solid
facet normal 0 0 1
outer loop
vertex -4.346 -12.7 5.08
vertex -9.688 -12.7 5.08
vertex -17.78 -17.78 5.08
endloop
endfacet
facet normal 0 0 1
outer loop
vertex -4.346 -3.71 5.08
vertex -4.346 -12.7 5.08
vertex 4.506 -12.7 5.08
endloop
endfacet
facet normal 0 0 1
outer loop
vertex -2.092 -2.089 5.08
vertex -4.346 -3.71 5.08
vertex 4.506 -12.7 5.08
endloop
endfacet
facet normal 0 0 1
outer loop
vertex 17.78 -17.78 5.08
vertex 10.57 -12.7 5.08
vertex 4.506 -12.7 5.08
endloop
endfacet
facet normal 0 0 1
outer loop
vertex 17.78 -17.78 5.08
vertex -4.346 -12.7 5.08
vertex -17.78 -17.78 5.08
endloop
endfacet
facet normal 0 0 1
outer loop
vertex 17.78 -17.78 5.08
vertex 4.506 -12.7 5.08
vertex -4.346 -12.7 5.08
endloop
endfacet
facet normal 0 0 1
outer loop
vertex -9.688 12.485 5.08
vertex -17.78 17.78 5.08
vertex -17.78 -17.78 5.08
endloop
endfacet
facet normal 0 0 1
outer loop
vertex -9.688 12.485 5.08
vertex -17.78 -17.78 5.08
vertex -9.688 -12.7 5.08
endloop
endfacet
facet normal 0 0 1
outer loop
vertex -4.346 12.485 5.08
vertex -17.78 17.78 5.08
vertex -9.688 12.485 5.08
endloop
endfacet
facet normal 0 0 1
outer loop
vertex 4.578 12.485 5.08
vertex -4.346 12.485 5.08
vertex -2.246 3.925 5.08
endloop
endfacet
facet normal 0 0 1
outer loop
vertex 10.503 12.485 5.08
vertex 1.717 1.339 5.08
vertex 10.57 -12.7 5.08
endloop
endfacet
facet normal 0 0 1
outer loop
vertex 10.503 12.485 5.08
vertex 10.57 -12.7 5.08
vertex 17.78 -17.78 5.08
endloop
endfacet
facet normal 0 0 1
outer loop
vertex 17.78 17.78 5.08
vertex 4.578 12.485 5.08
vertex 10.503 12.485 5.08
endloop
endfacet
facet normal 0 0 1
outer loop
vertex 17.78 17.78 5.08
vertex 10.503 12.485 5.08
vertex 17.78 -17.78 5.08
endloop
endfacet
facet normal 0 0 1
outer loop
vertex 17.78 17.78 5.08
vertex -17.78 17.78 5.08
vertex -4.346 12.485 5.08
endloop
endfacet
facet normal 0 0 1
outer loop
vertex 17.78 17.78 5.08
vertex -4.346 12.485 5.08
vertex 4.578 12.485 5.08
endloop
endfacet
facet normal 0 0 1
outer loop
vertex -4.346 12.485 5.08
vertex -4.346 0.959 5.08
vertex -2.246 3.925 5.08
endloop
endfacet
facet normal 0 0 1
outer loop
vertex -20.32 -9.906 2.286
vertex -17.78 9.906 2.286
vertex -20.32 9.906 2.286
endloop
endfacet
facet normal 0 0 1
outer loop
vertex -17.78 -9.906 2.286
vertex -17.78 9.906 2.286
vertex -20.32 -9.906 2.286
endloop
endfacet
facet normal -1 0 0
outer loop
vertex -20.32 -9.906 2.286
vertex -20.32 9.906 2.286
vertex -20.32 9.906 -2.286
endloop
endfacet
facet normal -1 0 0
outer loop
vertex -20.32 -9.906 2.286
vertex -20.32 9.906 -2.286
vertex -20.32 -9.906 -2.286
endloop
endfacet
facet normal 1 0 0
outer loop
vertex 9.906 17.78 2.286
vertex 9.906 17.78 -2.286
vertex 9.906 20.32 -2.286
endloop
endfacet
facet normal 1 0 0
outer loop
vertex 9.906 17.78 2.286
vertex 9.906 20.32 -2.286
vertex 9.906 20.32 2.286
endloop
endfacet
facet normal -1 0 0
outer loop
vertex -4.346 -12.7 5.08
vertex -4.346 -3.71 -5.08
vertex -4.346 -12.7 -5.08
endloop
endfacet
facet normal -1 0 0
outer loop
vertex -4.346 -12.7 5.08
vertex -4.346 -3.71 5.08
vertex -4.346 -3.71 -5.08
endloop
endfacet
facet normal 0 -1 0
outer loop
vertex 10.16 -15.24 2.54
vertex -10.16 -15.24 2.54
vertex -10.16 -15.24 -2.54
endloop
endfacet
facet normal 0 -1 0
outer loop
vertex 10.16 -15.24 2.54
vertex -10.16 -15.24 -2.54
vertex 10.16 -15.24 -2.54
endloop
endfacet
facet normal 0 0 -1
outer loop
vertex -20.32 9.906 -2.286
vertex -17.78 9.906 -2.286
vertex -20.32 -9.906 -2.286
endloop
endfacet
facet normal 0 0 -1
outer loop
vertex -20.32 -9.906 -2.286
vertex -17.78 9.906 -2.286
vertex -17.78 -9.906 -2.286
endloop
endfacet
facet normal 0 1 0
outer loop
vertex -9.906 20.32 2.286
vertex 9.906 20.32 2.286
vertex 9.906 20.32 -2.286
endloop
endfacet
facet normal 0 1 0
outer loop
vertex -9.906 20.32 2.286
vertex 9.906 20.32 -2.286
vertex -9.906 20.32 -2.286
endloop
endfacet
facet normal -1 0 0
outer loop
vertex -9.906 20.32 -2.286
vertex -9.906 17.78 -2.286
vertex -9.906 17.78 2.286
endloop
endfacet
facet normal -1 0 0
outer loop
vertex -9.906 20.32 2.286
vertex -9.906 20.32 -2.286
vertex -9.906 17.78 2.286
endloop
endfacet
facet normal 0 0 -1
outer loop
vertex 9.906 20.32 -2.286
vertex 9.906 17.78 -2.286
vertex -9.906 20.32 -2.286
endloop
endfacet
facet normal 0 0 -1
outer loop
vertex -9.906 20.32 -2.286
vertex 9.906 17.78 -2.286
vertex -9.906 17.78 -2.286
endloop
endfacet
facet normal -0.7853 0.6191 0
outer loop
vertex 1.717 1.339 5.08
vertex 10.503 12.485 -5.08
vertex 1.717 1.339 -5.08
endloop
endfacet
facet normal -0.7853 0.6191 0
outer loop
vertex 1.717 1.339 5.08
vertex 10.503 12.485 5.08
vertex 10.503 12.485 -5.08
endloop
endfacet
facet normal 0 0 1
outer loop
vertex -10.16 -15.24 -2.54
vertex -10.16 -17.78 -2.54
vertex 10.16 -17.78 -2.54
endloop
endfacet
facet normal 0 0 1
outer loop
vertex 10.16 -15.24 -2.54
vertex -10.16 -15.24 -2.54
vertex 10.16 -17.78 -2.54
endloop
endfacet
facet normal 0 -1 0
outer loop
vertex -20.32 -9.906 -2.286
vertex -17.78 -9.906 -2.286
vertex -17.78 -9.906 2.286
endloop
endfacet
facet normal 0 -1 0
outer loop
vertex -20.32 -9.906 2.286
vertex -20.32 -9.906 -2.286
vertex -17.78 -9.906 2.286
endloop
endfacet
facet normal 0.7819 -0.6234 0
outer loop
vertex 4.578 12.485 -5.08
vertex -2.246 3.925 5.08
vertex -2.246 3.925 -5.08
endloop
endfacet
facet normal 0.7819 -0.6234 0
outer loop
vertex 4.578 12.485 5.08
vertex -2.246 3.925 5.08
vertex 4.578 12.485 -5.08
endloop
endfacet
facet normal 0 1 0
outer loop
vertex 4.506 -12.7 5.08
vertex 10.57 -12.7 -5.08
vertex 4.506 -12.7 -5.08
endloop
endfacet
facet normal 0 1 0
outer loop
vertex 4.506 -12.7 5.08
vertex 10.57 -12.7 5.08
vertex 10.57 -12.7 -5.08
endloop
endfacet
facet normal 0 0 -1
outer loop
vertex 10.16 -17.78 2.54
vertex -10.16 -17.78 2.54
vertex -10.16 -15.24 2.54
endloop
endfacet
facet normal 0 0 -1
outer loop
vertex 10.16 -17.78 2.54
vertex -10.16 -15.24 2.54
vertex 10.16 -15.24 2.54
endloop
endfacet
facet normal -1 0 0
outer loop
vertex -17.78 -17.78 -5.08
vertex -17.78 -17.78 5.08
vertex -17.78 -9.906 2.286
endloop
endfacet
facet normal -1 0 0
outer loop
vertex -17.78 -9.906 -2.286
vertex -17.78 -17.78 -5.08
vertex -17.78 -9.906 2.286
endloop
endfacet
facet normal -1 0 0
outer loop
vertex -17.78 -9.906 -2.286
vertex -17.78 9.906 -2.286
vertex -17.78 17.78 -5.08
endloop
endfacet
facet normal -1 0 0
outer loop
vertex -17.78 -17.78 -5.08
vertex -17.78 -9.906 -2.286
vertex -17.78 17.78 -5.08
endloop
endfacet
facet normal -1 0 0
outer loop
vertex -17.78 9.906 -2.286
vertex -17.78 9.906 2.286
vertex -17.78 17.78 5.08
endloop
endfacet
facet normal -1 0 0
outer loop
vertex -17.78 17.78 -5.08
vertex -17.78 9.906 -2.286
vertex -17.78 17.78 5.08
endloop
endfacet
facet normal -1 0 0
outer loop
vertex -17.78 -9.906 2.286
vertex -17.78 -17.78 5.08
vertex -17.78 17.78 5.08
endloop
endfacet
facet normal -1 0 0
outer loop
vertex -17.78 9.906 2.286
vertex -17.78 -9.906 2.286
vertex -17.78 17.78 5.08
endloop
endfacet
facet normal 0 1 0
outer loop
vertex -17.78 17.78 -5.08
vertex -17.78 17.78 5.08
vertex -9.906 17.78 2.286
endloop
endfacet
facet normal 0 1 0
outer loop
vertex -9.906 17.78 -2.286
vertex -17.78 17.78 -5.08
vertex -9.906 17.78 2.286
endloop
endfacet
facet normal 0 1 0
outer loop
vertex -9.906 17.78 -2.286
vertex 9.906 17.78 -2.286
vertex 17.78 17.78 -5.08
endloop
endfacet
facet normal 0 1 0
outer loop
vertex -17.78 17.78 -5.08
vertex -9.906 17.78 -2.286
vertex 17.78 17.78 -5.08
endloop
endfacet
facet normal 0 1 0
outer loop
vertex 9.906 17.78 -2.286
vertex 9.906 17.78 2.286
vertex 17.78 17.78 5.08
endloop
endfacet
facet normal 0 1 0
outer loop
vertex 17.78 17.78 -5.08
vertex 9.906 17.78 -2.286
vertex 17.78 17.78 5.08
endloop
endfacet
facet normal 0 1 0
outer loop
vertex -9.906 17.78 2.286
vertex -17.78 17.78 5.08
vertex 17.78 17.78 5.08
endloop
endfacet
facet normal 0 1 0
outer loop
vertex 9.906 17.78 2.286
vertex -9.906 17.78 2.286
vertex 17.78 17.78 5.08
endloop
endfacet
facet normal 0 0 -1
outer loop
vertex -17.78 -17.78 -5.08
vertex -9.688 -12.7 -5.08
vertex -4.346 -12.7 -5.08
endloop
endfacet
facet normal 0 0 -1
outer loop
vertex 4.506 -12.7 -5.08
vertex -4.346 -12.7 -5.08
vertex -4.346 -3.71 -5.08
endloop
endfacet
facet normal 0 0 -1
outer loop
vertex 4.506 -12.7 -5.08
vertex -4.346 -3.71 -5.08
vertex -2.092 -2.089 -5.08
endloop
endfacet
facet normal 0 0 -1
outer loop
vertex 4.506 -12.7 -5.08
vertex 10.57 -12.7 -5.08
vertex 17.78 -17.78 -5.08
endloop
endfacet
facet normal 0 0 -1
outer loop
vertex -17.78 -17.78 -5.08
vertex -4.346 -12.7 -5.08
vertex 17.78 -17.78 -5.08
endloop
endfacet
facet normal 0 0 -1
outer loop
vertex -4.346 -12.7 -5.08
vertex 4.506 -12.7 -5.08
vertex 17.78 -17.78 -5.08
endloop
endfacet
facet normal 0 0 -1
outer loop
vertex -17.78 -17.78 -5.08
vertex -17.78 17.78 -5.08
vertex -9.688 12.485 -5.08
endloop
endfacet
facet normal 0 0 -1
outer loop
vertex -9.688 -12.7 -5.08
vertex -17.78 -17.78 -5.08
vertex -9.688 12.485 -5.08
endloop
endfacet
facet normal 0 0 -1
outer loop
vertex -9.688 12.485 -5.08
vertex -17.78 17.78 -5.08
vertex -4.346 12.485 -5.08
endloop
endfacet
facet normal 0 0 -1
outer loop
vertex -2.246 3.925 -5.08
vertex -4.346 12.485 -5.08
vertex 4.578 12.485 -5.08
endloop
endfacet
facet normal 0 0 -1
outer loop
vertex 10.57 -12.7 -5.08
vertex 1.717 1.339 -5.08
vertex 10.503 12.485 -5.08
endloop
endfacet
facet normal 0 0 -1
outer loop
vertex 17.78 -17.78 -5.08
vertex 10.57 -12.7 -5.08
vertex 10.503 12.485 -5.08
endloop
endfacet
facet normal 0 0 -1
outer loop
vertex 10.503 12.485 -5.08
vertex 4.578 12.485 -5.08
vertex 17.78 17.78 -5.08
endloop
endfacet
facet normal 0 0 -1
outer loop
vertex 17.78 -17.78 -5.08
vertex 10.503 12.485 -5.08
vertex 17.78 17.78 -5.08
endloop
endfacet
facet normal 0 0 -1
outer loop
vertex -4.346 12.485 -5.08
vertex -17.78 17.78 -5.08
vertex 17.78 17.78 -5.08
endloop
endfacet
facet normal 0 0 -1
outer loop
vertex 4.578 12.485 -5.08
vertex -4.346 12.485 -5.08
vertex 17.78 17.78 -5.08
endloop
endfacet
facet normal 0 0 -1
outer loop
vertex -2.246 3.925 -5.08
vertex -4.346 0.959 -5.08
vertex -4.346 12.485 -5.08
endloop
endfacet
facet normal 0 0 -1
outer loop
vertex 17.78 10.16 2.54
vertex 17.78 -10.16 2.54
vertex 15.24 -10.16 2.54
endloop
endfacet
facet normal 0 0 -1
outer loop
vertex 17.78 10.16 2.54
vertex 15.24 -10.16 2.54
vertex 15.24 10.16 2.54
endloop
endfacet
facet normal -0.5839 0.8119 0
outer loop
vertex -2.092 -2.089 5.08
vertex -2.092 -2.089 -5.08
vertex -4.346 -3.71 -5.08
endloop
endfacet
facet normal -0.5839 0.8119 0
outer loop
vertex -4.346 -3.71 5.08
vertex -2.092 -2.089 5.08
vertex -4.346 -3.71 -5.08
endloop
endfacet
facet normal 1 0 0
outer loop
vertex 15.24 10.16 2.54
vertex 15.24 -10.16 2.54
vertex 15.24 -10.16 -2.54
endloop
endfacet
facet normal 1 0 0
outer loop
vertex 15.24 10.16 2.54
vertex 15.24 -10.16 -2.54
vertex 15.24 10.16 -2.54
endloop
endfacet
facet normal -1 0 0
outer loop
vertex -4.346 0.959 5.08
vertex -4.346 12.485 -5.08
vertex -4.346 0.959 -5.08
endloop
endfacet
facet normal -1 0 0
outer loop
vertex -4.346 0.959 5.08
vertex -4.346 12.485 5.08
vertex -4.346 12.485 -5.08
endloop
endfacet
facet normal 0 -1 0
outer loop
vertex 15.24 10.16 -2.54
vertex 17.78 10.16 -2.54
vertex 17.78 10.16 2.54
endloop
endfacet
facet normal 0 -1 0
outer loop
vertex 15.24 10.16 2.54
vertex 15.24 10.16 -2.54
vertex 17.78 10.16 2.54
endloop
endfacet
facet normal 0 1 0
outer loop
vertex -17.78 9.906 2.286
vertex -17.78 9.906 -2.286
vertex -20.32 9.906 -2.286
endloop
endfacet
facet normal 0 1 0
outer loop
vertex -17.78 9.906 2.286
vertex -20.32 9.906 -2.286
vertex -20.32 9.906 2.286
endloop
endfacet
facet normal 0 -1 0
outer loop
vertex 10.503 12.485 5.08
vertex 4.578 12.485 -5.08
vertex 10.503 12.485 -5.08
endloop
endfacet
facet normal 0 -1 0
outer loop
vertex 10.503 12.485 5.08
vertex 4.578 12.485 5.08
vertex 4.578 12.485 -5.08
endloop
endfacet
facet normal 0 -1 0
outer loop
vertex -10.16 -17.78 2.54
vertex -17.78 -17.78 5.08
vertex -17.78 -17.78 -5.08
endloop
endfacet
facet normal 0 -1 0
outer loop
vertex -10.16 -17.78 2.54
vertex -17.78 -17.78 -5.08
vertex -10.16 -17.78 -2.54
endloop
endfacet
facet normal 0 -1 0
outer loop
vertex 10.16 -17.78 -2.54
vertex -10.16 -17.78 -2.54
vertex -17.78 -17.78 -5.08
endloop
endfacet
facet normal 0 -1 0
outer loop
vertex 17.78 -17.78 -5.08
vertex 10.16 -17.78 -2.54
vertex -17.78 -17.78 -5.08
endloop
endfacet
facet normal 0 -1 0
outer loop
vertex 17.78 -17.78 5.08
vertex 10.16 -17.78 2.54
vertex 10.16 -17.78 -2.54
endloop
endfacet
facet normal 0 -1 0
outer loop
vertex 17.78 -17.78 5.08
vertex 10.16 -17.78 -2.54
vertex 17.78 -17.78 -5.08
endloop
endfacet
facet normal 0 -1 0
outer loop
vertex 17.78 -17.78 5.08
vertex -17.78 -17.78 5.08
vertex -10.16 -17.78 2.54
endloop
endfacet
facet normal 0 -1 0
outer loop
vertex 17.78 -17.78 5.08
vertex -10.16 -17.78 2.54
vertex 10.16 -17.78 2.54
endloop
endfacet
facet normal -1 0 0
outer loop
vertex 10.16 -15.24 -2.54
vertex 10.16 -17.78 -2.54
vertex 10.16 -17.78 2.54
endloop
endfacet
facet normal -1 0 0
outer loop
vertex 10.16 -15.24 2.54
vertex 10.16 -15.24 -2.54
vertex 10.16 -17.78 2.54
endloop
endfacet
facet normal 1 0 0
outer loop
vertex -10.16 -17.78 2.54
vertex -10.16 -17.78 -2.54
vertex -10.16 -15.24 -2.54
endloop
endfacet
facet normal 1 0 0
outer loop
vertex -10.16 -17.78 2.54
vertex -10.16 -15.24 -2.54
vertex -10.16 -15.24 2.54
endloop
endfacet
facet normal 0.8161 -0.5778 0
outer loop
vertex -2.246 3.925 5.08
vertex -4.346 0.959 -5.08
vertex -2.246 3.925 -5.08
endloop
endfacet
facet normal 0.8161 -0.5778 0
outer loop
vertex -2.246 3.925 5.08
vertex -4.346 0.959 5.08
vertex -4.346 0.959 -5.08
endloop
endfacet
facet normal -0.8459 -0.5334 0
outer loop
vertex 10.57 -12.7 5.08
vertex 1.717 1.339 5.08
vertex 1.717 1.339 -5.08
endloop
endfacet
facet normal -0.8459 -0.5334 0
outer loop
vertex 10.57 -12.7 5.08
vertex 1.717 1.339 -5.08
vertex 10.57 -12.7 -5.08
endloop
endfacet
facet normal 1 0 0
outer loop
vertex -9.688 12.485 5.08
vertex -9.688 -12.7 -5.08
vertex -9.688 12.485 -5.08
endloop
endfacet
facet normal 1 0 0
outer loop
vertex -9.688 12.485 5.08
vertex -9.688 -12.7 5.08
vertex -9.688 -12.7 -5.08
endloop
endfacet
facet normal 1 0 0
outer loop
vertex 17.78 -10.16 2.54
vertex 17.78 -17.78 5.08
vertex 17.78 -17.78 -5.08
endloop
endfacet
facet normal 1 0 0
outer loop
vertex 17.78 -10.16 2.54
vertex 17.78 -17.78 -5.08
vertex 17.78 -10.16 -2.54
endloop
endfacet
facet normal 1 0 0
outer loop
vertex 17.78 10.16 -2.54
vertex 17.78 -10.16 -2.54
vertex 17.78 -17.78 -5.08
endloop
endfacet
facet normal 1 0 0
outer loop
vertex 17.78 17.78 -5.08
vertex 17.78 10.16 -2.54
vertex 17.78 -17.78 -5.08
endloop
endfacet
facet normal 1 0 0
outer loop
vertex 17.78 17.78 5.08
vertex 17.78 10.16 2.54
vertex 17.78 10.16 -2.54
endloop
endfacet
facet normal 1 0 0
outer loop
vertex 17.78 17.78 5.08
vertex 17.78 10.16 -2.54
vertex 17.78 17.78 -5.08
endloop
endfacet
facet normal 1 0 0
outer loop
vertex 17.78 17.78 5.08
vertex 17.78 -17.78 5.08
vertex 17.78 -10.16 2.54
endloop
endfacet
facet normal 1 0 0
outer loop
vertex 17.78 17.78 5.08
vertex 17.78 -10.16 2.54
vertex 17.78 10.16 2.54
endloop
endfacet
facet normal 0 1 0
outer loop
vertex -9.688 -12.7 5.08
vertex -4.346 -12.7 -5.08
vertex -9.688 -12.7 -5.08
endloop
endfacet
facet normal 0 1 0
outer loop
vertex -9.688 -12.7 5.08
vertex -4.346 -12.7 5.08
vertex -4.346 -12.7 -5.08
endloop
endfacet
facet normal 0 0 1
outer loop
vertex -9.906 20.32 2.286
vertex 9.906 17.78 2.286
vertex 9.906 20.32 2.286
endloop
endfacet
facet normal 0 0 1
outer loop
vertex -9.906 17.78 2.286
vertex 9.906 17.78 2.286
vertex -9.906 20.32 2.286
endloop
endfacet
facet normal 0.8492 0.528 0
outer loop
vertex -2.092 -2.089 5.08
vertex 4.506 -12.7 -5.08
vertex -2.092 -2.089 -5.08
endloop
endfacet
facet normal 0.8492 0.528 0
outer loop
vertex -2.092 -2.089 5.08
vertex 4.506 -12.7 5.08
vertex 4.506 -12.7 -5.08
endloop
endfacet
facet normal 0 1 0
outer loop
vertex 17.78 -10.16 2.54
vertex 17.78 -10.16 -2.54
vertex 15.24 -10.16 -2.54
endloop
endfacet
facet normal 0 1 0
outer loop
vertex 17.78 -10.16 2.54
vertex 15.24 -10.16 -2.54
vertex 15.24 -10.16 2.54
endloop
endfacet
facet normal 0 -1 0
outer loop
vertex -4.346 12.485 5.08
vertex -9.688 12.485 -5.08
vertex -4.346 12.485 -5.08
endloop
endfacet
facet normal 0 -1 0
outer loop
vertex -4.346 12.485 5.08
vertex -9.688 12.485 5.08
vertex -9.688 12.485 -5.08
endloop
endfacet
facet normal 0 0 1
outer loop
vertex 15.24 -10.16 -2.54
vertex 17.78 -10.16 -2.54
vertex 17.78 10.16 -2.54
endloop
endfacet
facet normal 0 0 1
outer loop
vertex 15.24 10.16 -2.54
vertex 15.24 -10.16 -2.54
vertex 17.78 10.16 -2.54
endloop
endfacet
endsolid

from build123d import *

# Parameters (mm, degrees)
F0_W     = 35.56
F0_H     = 35.56
F1_DEPTH = 5.08
F2_W     = 19.812
F2_H     = 4.572
F3_DEPTH = 2.54
F4_W     = 19.812
F4_H     = 4.572
F5_DEPTH = 2.54
F6_W     = 20.32
F6_H     = 5.08
F7_DEPTH = 2.54
F8_W     = 20.32
F8_H     = 5.08
F9_DEPTH = 2.54


with BuildPart() as f1:
    # F0 (on Top) → F1 (new body, symmetric)
    with BuildSketch(Plane.XY):
        Rectangle(F0_W, F0_H)
        Polygon((1.7170355903, 1.339453125), (10.5695529514, -12.7), (4.5061848958, -12.7), (-2.0918619792, -2.0891059028), (-4.3463324653, -3.7096788194), (-4.3463324653, -12.7), (-9.6876085069, -12.7), (-9.6876085069, 12.4850260417), (-4.3463324653, 12.4850260417), (-4.3463324653, 0.9591145833), (-2.2462022569, 3.9246527778), (4.5778428819, 12.4850260417), (10.5034071181, 12.4850260417), align=None, mode=Mode.SUBTRACT)
    extrude(amount=F1_DEPTH, both=True)

    # F2 (on face) → F3 (join)
    with BuildSketch(Plane(origin=(0, 17.78, 0), x_dir=(-1, 0, 0), z_dir=(0, 1, 0))):
        Rectangle(F2_W, F2_H)
    extrude(amount=F3_DEPTH)

    # F4 (on face) → F5 (join)
    with BuildSketch(Plane(origin=(-17.78, 0, 0), x_dir=(0, -1, 0), z_dir=(-1, 0, 0))):
        Rectangle(F4_W, F4_H)
    extrude(amount=F5_DEPTH)

    # F6 (on face) → F7 (cut)
    with BuildSketch(Plane.XZ.offset(17.78)):
        Rectangle(F6_W, F6_H)
    extrude(amount=-F7_DEPTH, mode=Mode.SUBTRACT)

    # F8 (on face) → F9 (cut)
    with BuildSketch(Plane.YZ.offset(17.78)):
        Rectangle(F8_W, F8_H)
    extrude(amount=-F9_DEPTH, mode=Mode.SUBTRACT)


solid = f1.part
